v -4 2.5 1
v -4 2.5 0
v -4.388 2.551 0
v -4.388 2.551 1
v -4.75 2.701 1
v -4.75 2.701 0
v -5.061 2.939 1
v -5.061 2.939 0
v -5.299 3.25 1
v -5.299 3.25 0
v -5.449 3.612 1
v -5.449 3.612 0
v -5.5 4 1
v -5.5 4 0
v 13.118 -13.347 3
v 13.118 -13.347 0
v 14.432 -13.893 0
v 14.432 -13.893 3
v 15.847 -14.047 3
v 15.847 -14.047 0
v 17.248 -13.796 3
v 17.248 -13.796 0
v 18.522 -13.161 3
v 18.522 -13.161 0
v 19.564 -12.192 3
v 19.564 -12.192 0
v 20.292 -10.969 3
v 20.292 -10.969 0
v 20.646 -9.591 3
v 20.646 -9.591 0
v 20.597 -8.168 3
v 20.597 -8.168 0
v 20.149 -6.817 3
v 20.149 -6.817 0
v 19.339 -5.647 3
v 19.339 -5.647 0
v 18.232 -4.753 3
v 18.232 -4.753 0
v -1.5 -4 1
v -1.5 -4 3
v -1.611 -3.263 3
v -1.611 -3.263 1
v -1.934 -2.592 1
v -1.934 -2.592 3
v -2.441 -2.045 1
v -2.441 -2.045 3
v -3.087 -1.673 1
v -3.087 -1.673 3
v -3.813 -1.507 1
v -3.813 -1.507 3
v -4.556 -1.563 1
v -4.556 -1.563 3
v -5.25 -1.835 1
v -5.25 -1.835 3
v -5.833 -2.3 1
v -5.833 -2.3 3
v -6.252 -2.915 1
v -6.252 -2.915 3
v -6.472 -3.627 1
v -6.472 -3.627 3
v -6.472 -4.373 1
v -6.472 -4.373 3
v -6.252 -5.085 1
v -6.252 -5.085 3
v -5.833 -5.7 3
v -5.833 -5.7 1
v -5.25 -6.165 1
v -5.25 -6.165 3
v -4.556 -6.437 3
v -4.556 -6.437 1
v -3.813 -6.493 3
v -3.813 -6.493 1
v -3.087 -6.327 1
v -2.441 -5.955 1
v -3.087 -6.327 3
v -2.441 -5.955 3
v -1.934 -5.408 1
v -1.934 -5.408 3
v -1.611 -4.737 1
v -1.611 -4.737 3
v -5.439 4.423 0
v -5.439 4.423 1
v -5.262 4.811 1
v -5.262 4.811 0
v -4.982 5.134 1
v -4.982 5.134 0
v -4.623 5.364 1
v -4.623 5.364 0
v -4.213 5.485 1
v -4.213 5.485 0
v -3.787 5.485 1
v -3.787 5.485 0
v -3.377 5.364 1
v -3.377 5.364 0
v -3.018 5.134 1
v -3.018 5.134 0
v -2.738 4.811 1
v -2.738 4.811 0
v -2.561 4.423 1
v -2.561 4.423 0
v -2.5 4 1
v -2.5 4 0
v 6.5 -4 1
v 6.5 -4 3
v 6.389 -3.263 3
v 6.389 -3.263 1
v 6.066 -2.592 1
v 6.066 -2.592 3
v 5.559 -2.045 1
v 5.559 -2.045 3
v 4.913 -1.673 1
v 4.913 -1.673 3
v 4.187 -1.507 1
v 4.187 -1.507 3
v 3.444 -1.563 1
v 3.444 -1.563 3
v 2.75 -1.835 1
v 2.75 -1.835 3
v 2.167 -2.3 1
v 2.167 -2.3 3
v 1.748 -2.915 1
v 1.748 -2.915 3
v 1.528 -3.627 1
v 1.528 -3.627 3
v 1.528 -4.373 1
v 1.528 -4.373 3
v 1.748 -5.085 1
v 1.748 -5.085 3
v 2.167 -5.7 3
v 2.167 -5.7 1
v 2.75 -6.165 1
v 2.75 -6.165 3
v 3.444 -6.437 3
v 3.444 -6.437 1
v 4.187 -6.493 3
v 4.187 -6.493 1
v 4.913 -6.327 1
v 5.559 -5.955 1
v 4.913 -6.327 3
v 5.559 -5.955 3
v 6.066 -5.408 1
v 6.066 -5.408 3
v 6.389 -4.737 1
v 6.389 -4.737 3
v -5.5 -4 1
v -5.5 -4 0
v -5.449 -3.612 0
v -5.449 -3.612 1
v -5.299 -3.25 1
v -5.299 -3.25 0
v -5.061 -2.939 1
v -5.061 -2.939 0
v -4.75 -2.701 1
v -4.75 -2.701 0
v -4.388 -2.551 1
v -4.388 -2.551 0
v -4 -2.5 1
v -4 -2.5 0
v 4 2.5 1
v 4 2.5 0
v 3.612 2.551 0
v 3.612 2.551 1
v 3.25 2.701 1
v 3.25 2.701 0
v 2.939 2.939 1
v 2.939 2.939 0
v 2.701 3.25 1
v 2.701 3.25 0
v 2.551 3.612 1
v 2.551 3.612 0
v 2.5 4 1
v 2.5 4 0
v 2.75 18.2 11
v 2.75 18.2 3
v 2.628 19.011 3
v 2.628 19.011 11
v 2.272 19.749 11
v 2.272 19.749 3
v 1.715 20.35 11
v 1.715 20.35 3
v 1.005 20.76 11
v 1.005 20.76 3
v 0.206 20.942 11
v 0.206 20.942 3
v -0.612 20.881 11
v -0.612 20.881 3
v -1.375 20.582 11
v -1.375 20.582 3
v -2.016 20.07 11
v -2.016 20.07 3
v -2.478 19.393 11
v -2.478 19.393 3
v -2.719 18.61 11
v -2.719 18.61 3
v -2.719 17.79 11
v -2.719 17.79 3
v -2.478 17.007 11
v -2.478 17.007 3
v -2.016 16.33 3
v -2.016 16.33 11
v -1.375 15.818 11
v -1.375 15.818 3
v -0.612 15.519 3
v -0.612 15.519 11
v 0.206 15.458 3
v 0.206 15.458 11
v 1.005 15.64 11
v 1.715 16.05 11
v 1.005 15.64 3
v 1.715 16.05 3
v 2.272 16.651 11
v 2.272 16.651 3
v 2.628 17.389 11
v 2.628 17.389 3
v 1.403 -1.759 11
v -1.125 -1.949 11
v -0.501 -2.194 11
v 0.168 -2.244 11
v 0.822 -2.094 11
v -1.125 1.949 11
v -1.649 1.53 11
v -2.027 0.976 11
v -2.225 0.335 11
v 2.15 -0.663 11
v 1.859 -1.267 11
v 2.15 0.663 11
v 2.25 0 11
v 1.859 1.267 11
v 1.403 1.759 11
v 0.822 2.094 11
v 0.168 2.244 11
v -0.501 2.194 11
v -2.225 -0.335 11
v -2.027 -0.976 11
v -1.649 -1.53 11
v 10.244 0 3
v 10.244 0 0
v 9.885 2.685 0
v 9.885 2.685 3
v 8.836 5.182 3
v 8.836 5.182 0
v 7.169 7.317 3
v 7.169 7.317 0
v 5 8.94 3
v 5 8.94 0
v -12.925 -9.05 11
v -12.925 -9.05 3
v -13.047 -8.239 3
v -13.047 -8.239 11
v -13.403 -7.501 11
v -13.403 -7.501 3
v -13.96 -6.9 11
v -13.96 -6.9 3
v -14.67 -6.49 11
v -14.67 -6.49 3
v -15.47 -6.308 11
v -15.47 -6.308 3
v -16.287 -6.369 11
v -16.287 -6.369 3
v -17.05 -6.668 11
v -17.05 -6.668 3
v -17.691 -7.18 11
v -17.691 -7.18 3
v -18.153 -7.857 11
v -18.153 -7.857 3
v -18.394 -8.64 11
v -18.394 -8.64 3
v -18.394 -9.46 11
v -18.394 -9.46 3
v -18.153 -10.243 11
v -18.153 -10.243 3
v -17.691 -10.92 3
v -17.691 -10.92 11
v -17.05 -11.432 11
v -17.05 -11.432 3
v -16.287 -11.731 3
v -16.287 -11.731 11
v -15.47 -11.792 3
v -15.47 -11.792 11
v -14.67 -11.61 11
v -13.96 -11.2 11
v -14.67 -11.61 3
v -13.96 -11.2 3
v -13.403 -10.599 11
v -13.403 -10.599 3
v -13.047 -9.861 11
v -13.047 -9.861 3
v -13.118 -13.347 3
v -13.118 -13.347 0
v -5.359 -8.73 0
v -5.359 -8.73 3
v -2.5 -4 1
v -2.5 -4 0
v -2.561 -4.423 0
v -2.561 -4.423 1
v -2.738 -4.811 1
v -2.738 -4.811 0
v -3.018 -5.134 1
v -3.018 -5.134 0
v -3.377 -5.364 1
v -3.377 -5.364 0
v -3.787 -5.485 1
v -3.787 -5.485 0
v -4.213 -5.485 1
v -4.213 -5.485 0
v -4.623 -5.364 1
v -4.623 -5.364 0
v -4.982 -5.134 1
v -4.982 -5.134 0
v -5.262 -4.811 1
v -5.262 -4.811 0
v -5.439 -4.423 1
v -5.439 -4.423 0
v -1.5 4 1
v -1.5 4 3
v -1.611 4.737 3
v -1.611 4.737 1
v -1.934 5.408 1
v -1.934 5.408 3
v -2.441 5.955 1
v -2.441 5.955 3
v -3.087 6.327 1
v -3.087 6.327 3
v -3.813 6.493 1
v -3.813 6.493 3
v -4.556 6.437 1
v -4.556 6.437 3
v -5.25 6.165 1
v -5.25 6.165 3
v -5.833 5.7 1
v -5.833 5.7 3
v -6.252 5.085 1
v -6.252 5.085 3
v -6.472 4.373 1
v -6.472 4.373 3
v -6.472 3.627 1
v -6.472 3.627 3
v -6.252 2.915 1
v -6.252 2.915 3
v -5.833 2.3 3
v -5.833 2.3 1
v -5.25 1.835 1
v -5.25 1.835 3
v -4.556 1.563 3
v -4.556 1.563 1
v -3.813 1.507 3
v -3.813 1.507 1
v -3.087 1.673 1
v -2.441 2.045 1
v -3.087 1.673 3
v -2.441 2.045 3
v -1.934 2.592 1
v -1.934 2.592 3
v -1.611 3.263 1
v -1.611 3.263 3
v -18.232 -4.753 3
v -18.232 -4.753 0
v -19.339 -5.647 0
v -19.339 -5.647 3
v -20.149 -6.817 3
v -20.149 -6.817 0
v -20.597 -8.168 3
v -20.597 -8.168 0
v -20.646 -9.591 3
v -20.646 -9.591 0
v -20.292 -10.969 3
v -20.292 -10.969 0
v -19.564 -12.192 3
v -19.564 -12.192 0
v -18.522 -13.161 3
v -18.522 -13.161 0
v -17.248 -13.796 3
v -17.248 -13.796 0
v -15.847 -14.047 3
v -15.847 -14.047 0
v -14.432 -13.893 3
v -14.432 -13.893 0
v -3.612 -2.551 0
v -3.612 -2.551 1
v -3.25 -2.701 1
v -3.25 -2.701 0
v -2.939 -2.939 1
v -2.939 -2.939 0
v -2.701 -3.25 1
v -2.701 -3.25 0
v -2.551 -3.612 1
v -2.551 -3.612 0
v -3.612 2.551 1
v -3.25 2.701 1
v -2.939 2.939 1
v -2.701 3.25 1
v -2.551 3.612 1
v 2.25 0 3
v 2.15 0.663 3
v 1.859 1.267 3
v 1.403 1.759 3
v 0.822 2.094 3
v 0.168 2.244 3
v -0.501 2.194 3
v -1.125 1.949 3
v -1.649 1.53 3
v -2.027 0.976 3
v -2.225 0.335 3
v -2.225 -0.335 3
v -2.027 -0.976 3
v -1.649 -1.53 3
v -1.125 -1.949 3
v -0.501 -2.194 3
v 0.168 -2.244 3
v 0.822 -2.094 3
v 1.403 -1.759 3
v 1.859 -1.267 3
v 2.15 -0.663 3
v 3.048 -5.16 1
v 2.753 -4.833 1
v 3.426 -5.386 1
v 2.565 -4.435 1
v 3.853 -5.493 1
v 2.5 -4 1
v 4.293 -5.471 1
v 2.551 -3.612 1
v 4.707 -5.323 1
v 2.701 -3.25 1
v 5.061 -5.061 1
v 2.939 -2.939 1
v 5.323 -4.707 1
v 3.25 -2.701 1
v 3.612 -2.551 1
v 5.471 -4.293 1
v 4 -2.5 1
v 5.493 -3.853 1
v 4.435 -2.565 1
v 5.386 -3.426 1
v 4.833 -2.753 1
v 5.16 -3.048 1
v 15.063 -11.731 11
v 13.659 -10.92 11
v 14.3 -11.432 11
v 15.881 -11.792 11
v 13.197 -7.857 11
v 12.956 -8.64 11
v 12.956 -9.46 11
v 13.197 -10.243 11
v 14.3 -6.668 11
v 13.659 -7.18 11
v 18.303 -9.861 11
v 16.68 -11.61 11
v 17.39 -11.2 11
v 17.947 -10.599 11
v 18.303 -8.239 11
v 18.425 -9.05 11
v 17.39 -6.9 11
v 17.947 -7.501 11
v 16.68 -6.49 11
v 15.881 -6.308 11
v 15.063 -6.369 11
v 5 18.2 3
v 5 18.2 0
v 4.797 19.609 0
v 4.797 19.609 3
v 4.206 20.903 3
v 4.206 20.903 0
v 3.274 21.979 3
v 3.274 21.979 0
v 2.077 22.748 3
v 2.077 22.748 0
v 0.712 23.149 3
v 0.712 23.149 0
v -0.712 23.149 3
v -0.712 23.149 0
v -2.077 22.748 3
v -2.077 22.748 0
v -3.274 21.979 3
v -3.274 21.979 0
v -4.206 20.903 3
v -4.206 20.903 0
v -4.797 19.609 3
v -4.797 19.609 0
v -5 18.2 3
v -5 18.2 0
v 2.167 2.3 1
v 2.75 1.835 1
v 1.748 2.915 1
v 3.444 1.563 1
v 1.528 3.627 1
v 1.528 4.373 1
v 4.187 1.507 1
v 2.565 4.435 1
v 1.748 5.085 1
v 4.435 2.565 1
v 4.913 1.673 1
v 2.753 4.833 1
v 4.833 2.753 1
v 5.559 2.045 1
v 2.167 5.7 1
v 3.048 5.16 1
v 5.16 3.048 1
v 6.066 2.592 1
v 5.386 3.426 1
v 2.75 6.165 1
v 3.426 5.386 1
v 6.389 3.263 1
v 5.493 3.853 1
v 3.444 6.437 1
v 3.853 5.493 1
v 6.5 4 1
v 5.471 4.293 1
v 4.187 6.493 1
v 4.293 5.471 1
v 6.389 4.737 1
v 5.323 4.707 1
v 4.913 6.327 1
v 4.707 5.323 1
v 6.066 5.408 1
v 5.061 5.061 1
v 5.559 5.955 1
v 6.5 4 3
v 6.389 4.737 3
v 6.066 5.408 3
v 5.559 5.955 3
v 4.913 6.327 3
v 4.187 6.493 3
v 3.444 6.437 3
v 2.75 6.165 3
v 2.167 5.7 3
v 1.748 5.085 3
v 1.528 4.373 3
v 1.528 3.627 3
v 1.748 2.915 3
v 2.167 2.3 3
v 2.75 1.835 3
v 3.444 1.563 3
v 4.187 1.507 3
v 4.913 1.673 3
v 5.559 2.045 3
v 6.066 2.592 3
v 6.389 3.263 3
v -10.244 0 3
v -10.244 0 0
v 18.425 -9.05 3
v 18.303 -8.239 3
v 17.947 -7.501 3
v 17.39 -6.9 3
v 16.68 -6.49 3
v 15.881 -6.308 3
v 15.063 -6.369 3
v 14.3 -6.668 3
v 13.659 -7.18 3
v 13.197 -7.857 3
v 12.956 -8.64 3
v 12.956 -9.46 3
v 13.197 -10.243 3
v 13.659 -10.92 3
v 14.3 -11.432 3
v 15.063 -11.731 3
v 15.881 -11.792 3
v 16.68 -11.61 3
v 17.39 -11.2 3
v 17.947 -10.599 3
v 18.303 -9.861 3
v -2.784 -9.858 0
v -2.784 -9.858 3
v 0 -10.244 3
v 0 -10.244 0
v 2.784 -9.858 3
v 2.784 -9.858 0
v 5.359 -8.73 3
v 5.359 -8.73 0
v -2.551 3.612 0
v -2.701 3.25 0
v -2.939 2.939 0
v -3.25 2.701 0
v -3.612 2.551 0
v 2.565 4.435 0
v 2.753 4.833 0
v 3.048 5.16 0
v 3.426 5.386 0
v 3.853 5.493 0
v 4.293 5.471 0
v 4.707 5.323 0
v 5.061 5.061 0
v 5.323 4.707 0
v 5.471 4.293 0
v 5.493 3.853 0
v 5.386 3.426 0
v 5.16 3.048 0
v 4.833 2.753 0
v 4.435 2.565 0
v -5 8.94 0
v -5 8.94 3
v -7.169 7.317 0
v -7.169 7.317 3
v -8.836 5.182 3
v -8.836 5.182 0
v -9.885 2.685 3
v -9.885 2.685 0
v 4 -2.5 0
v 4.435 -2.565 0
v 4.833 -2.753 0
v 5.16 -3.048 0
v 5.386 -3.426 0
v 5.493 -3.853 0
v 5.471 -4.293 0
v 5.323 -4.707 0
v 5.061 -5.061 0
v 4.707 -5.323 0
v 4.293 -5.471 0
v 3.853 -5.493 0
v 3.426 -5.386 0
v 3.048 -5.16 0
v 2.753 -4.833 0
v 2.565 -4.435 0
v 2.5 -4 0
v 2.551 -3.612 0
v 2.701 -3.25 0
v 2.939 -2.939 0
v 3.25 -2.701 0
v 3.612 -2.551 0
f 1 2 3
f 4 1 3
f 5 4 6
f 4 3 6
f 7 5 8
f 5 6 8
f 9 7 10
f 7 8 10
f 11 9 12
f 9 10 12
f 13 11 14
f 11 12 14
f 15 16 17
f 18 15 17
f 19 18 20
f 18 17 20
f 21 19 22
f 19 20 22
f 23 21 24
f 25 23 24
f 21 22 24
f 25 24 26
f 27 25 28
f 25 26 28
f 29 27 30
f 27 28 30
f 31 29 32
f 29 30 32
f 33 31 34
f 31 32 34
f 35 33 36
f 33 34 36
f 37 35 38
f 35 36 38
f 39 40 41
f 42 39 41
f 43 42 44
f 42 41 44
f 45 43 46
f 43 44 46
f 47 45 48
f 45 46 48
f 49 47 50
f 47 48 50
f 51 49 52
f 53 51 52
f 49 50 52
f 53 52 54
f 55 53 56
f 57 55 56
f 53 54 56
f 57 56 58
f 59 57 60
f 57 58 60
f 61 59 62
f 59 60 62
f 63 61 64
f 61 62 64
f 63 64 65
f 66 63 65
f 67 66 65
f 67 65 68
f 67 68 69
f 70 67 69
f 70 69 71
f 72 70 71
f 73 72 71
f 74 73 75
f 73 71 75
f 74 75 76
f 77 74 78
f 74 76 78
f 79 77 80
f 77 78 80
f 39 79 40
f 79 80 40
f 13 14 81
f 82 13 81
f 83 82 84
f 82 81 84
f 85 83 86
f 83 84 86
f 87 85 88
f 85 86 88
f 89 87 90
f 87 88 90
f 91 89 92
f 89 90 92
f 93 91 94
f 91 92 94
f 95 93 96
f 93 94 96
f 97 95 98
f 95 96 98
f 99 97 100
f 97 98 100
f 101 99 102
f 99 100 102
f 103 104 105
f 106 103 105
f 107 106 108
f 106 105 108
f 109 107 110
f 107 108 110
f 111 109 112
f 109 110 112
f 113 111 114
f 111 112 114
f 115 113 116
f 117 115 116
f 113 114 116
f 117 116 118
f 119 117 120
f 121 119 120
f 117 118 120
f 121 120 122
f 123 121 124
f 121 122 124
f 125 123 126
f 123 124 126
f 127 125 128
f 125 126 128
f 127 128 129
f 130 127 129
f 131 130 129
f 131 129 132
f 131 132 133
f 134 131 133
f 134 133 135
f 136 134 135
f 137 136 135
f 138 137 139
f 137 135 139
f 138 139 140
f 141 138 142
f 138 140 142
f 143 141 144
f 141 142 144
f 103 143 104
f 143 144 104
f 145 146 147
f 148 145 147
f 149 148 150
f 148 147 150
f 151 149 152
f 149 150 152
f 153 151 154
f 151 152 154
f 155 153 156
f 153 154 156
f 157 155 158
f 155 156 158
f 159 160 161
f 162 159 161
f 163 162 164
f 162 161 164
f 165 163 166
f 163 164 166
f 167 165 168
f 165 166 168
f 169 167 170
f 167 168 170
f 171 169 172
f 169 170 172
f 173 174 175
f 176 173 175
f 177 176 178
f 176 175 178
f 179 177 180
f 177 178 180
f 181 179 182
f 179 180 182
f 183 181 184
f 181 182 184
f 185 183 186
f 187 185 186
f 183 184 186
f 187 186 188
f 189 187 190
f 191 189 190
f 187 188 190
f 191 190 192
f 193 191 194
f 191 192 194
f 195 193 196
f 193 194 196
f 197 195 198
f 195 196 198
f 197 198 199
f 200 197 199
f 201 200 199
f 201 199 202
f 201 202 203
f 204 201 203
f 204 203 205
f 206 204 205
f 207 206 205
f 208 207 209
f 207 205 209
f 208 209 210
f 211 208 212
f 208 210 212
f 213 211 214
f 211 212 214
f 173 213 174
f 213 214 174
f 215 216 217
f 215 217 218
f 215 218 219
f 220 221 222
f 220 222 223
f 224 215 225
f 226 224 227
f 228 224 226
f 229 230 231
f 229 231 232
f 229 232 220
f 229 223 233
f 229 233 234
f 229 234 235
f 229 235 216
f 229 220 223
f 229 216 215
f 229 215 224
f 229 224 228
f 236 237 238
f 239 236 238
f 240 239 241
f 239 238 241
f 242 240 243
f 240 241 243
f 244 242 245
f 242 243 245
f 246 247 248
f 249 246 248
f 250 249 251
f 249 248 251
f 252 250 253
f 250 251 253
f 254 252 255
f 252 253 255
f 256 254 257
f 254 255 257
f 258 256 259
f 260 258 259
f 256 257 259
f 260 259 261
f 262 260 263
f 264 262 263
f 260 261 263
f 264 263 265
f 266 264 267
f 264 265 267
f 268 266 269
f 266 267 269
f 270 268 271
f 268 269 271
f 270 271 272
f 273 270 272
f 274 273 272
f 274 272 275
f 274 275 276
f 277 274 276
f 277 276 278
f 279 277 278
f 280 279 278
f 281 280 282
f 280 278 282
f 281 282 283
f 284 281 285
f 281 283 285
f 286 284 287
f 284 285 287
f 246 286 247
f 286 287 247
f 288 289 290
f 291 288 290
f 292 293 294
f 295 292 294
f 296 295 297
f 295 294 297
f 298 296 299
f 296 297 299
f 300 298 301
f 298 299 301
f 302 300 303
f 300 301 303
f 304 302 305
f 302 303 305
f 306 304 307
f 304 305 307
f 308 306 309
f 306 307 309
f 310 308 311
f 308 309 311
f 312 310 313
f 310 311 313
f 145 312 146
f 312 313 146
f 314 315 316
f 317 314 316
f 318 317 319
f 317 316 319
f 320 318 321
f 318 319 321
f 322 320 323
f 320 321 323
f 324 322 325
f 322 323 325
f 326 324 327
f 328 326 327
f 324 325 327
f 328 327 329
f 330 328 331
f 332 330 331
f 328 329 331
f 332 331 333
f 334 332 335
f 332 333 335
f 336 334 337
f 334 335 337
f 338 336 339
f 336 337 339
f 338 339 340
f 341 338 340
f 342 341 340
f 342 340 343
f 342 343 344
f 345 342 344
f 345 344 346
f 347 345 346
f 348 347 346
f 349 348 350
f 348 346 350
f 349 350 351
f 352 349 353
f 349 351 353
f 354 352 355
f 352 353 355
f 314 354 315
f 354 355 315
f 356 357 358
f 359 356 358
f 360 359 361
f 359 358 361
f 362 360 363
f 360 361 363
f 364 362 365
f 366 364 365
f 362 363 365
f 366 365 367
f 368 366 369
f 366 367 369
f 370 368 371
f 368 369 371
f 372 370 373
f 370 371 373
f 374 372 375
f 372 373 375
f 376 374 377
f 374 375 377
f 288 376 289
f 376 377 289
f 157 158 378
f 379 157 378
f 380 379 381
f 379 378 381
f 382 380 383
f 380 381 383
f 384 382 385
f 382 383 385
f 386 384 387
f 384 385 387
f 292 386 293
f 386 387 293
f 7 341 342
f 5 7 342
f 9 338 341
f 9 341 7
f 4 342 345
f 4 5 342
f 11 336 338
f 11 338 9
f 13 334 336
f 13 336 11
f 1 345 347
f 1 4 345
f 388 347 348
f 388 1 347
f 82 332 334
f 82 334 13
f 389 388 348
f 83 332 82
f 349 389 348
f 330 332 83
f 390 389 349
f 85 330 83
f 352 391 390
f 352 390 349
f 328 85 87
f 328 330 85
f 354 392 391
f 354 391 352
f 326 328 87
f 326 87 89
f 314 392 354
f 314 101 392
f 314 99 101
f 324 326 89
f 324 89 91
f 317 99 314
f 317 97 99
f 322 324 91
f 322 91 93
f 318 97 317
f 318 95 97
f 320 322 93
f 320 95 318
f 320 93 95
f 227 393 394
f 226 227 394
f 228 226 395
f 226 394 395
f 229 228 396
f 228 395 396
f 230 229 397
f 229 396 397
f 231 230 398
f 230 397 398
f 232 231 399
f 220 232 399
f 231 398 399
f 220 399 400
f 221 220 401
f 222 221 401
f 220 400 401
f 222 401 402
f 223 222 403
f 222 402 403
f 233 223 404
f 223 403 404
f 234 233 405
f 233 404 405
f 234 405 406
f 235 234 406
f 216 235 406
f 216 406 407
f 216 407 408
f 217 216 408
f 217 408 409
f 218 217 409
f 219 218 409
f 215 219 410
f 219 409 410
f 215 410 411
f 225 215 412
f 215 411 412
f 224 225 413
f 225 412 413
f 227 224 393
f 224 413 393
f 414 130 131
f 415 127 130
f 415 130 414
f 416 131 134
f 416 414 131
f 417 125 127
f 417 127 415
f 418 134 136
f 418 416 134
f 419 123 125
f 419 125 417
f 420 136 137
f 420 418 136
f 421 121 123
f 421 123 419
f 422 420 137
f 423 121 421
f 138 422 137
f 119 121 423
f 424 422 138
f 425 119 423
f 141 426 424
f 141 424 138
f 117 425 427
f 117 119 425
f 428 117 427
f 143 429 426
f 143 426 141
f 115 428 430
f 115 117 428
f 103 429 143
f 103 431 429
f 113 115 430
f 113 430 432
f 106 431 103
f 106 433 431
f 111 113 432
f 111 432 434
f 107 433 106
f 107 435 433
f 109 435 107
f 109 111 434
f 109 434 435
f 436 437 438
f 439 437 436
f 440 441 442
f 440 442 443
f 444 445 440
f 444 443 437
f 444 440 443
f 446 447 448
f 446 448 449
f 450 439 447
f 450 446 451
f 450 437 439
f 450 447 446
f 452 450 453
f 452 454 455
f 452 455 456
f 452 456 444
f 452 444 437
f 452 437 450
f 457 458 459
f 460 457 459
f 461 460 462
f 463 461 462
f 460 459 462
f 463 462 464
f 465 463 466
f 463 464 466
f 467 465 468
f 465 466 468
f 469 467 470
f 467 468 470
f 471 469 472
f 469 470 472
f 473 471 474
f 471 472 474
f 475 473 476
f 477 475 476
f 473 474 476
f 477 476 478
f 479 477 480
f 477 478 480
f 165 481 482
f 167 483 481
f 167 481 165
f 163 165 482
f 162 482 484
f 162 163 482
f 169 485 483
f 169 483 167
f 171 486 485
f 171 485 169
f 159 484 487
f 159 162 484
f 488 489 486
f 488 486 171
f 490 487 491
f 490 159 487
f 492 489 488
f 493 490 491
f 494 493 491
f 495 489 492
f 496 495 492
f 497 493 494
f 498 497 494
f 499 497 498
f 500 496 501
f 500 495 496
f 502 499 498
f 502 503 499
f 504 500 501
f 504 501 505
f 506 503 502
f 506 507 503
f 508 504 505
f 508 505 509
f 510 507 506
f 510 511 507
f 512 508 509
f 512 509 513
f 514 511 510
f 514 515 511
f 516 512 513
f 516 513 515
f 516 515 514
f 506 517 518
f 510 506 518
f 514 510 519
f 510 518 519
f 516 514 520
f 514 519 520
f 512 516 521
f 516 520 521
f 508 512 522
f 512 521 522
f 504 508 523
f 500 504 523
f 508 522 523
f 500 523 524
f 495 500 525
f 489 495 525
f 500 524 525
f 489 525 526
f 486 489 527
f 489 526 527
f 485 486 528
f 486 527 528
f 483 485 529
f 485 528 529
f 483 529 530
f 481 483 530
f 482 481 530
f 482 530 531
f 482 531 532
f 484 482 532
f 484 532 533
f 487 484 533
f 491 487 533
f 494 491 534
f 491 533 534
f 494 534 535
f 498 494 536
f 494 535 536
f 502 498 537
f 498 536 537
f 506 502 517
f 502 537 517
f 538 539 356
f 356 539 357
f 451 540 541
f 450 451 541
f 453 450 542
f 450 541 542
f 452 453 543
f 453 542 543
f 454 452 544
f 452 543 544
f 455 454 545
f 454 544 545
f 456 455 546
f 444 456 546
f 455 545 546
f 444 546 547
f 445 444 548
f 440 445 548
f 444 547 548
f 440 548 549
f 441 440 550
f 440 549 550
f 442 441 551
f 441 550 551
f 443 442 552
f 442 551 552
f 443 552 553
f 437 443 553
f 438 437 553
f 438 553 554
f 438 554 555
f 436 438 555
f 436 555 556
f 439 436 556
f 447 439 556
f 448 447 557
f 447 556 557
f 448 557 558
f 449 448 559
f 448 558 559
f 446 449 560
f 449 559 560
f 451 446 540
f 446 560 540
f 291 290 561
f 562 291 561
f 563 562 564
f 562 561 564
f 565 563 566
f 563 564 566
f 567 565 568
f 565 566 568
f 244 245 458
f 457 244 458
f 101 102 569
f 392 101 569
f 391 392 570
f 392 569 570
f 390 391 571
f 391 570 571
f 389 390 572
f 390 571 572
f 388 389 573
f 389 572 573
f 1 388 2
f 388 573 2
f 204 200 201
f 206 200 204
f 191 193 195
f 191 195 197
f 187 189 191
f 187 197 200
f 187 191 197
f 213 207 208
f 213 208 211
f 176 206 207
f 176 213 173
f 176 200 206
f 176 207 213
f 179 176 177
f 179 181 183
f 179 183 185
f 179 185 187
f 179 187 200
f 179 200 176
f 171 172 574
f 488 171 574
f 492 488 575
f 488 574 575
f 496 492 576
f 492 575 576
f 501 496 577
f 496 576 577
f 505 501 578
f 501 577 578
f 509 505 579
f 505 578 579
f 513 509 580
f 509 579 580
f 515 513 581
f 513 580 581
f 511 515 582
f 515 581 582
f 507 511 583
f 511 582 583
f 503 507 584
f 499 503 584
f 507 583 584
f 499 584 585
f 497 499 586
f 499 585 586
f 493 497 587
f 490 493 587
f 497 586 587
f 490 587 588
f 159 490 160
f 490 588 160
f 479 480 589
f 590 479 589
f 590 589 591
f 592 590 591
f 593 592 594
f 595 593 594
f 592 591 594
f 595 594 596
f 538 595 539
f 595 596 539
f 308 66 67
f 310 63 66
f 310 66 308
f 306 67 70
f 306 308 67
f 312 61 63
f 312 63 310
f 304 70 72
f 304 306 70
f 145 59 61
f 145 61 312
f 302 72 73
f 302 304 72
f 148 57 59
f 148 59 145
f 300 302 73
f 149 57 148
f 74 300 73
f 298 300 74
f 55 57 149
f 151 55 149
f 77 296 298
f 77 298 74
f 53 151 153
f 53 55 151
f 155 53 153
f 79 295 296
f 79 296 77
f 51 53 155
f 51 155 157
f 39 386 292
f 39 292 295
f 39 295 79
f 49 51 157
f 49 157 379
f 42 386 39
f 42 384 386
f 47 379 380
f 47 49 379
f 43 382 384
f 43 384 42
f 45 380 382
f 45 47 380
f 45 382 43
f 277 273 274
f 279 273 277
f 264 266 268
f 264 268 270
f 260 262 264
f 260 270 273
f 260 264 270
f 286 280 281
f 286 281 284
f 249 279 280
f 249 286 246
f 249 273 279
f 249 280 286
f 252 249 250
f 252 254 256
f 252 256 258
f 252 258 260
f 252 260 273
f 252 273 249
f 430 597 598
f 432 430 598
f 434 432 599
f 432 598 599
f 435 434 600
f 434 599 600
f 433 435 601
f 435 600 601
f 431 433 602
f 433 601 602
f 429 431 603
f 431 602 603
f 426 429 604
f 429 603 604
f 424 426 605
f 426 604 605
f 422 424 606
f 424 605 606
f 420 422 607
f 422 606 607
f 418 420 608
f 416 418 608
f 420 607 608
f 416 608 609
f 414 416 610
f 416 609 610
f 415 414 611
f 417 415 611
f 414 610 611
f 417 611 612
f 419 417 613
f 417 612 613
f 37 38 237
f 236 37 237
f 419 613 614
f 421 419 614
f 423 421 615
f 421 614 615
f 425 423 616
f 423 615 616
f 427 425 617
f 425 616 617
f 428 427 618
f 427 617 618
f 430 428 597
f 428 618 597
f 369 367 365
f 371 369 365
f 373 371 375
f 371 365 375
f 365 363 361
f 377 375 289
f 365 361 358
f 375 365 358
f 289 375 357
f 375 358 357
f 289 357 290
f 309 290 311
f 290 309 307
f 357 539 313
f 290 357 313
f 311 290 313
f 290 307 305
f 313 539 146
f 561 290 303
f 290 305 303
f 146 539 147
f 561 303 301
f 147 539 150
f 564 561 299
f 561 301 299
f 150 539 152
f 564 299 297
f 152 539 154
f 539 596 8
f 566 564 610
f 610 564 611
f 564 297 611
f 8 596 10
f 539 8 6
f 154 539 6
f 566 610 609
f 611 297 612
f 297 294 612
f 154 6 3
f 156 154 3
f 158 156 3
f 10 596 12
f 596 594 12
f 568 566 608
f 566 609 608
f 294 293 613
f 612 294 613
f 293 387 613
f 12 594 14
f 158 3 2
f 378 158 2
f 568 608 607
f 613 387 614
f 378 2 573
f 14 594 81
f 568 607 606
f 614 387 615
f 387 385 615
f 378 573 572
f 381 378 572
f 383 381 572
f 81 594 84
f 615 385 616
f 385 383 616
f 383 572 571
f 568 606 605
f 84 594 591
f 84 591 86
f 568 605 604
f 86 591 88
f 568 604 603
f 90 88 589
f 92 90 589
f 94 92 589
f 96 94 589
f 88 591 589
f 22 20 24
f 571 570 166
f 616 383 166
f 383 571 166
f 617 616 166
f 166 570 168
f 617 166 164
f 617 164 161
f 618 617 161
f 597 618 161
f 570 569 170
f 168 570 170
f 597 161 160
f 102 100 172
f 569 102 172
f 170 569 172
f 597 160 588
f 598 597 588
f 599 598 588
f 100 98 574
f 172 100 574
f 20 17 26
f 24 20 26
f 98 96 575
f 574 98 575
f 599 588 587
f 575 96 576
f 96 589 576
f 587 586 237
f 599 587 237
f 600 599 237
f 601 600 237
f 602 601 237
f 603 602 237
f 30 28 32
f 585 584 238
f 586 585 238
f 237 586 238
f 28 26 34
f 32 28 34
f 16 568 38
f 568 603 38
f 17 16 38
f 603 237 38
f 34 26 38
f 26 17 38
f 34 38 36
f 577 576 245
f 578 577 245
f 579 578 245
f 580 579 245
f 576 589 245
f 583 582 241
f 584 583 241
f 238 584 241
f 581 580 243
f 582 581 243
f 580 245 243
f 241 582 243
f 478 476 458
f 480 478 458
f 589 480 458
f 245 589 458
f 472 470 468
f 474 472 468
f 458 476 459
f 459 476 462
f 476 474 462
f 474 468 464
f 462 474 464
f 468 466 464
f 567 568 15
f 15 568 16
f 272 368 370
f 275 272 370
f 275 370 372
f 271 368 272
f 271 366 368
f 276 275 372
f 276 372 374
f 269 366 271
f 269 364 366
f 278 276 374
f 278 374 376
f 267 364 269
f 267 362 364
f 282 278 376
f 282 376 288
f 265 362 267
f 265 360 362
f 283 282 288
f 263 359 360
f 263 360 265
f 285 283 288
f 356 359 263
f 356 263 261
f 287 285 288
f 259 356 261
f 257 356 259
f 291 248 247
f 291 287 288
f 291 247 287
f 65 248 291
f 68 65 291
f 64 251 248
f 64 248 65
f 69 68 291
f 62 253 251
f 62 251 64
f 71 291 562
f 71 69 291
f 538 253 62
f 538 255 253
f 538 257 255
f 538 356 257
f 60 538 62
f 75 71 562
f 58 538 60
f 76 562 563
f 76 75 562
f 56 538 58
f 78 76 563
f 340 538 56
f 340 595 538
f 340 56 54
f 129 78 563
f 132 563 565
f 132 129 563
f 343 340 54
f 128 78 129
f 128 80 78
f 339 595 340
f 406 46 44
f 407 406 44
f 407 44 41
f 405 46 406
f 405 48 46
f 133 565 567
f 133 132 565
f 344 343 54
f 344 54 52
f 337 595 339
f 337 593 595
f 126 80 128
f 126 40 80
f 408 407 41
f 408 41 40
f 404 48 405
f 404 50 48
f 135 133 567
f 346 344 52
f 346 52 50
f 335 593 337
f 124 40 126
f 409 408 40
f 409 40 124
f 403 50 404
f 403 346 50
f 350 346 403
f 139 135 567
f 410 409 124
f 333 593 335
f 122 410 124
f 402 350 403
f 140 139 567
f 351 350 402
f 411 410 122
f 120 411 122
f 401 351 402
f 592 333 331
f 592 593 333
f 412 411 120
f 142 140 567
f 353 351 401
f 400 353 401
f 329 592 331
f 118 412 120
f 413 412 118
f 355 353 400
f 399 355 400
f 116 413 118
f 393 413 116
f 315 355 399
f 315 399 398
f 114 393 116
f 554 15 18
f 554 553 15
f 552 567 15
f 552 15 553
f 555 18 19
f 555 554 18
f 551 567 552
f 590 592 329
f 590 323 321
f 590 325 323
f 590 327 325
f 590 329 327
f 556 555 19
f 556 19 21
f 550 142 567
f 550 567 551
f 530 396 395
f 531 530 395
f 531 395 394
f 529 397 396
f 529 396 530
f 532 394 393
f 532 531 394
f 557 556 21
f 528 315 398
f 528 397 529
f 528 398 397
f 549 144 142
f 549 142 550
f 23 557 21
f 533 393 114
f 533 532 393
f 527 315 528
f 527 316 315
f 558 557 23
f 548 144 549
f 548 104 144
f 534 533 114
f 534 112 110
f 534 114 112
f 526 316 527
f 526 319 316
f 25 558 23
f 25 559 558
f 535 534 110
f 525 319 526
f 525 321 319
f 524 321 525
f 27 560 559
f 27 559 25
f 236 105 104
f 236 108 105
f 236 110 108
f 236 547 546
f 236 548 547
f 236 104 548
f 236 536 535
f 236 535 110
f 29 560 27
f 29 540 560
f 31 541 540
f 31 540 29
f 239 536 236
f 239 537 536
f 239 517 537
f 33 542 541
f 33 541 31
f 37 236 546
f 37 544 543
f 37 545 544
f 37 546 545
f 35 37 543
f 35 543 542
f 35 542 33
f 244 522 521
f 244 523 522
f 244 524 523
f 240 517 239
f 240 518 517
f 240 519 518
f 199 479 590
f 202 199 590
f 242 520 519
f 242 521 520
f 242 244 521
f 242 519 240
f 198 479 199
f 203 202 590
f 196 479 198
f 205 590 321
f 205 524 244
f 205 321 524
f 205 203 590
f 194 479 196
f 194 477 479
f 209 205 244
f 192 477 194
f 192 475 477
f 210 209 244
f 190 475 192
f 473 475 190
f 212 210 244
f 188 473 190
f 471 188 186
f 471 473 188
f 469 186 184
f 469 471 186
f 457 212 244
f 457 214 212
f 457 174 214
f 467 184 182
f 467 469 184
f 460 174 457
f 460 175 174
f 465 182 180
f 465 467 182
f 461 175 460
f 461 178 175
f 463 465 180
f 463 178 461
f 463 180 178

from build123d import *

# Parameters (mm, degrees)
SALIENTE_EXTRUIR1_DEPTH = 3
CROQUIS2_R              = 2.75
SALIENTE_EXTRUIR2_DEPTH = 8
CROQUIS3_R              = 2.25
SALIENTE_EXTRUIR3_DEPTH = 8
CORTAR_EXTRUIR1_DEPTH   = 10
CROQUIS5_R              = 2.5
CORTAR_EXTRUIR2_DEPTH   = 2


with BuildPart() as part:
    # Croquis1 → Saliente-Extruir1 (new body)
    with BuildSketch(Plane.XY):
        with BuildLine():
            Line((-13.118348224, -13.346885602), (-5.358962429, -8.729934305))
            ThreePointArc((-5.358962429, -8.729934305), (0, -10.243545836), (5.358962429, -8.729934305))
            Line((5.358962429, -8.729934305), (13.118348224, -13.346885602))
            ThreePointArc((13.118348224, -13.346885602), (19.97194541, -11.606711584), (18.231771393, -4.753114398))
            Line((18.231771393, -4.753114398), (10.243545836, 0))
            ThreePointArc((10.243545836, 0), (8.83594818, 5.182301714), (5, 8.94037087))
            Line((5, 8.94037087), (5, 18.2))
            ThreePointArc((5, 18.2), (0, 23.2), (-5, 18.2))
            Line((-5, 18.2), (-5, 8.94037087))
            ThreePointArc((-5, 8.94037087), (-8.83594818, 5.182301714), (-10.243545836, 0))
            Line((-10.243545836, 0), (-18.231771393, -4.753114398))
            ThreePointArc((-18.231771393, -4.753114398), (-19.97194541, -11.606711584), (-13.118348224, -13.346885602))
        make_face()
    extrude(amount=SALIENTE_EXTRUIR1_DEPTH)

    # Croquis2 → Saliente-Extruir2 (add)
    with BuildSketch(Plane.XY.offset(3)):
        with Locations((0, 18.2)):
            Circle(CROQUIS2_R)
        with Locations((15.675059808, -9.05)):
            Circle(CROQUIS2_R)
        with Locations((-15.675059808, -9.05)):
            Circle(CROQUIS2_R)
    extrude(amount=SALIENTE_EXTRUIR2_DEPTH)

    # Croquis3 → Saliente-Extruir3 (add)
    with BuildSketch(Plane.XY.offset(3)):
        Circle(CROQUIS3_R)
    extrude(amount=SALIENTE_EXTRUIR3_DEPTH)

    # Croquis4 → Cortar-Extruir1 (cut)
    with BuildSketch(Plane(origin=(0, 0, 0), x_dir=(-1, 0, 0), z_dir=(0, 0, -1))):
        with BuildLine():
            Line((-4, 2.5), (-4, 4))
            Line((-4, 4), (-2.5, 4))
            ThreePointArc((-2.5, 4), (-5.060660172, 5.060660172), (-4, 2.5))
        make_face()
        with BuildLine():
            Line((-2.5, 4), (-4, 4))
            Line((-4, 4), (-4, 2.5))
            ThreePointArc((-4, 2.5), (-2.939339828, 2.939339828), (-2.5, 4))
        make_face()
        with BuildLine():
            ThreePointArc((5.5, 4), (4, 5.5), (2.5, 4))
            Line((2.5, 4), (4, 4))
            Line((4, 4), (4, 2.5))
            ThreePointArc((4, 2.5), (5.060660172, 2.939339828), (5.5, 4))
        make_face()
        with BuildLine():
            Line((4, 4), (2.5, 4))
            ThreePointArc((2.5, 4), (2.939339828, 2.939339828), (4, 2.5))
            Line((4, 2.5), (4, 4))
        make_face()
        with BuildLine():
            ThreePointArc((5.5, -4), (5.060660172, -2.939339828), (4, -2.5))
            Line((4, -2.5), (4, -4))
            Line((4, -4), (2.5, -4))
            ThreePointArc((2.5, -4), (4, -5.5), (5.5, -4))
        make_face()
        with BuildLine():
            Line((4, -4), (4, -2.5))
            ThreePointArc((4, -2.5), (2.939339828, -2.939339828), (2.5, -4))
            Line((2.5, -4), (4, -4))
        make_face()
        with BuildLine():
            ThreePointArc((-2.5, -4), (-2.939339828, -2.939339828), (-4, -2.5))
            Line((-4, -2.5), (-4, -4))
            Line((-4, -4), (-2.5, -4))
        make_face()
        with BuildLine():
            Line((-4, -4), (-4, -2.5))
            ThreePointArc((-4, -2.5), (-5.060660172, -5.060660172), (-2.5, -4))
            Line((-2.5, -4), (-4, -4))
        make_face()
    extrude(amount=-CORTAR_EXTRUIR1_DEPTH, mode=Mode.SUBTRACT)

    # Croquis5 → Cortar-Extruir2 (cut)
    with BuildSketch(Plane.XY.offset(3)):
        with Locations((-4, 4)):
            Circle(CROQUIS5_R)
        with Locations((4, 4)):
            Circle(CROQUIS5_R)
        with Locations((4, -4)):
            Circle(CROQUIS5_R)
        with Locations((-4, -4)):
            Circle(CROQUIS5_R)
    extrude(amount=-CORTAR_EXTRUIR2_DEPTH, mode=Mode.SUBTRACT)


solid = part.part
